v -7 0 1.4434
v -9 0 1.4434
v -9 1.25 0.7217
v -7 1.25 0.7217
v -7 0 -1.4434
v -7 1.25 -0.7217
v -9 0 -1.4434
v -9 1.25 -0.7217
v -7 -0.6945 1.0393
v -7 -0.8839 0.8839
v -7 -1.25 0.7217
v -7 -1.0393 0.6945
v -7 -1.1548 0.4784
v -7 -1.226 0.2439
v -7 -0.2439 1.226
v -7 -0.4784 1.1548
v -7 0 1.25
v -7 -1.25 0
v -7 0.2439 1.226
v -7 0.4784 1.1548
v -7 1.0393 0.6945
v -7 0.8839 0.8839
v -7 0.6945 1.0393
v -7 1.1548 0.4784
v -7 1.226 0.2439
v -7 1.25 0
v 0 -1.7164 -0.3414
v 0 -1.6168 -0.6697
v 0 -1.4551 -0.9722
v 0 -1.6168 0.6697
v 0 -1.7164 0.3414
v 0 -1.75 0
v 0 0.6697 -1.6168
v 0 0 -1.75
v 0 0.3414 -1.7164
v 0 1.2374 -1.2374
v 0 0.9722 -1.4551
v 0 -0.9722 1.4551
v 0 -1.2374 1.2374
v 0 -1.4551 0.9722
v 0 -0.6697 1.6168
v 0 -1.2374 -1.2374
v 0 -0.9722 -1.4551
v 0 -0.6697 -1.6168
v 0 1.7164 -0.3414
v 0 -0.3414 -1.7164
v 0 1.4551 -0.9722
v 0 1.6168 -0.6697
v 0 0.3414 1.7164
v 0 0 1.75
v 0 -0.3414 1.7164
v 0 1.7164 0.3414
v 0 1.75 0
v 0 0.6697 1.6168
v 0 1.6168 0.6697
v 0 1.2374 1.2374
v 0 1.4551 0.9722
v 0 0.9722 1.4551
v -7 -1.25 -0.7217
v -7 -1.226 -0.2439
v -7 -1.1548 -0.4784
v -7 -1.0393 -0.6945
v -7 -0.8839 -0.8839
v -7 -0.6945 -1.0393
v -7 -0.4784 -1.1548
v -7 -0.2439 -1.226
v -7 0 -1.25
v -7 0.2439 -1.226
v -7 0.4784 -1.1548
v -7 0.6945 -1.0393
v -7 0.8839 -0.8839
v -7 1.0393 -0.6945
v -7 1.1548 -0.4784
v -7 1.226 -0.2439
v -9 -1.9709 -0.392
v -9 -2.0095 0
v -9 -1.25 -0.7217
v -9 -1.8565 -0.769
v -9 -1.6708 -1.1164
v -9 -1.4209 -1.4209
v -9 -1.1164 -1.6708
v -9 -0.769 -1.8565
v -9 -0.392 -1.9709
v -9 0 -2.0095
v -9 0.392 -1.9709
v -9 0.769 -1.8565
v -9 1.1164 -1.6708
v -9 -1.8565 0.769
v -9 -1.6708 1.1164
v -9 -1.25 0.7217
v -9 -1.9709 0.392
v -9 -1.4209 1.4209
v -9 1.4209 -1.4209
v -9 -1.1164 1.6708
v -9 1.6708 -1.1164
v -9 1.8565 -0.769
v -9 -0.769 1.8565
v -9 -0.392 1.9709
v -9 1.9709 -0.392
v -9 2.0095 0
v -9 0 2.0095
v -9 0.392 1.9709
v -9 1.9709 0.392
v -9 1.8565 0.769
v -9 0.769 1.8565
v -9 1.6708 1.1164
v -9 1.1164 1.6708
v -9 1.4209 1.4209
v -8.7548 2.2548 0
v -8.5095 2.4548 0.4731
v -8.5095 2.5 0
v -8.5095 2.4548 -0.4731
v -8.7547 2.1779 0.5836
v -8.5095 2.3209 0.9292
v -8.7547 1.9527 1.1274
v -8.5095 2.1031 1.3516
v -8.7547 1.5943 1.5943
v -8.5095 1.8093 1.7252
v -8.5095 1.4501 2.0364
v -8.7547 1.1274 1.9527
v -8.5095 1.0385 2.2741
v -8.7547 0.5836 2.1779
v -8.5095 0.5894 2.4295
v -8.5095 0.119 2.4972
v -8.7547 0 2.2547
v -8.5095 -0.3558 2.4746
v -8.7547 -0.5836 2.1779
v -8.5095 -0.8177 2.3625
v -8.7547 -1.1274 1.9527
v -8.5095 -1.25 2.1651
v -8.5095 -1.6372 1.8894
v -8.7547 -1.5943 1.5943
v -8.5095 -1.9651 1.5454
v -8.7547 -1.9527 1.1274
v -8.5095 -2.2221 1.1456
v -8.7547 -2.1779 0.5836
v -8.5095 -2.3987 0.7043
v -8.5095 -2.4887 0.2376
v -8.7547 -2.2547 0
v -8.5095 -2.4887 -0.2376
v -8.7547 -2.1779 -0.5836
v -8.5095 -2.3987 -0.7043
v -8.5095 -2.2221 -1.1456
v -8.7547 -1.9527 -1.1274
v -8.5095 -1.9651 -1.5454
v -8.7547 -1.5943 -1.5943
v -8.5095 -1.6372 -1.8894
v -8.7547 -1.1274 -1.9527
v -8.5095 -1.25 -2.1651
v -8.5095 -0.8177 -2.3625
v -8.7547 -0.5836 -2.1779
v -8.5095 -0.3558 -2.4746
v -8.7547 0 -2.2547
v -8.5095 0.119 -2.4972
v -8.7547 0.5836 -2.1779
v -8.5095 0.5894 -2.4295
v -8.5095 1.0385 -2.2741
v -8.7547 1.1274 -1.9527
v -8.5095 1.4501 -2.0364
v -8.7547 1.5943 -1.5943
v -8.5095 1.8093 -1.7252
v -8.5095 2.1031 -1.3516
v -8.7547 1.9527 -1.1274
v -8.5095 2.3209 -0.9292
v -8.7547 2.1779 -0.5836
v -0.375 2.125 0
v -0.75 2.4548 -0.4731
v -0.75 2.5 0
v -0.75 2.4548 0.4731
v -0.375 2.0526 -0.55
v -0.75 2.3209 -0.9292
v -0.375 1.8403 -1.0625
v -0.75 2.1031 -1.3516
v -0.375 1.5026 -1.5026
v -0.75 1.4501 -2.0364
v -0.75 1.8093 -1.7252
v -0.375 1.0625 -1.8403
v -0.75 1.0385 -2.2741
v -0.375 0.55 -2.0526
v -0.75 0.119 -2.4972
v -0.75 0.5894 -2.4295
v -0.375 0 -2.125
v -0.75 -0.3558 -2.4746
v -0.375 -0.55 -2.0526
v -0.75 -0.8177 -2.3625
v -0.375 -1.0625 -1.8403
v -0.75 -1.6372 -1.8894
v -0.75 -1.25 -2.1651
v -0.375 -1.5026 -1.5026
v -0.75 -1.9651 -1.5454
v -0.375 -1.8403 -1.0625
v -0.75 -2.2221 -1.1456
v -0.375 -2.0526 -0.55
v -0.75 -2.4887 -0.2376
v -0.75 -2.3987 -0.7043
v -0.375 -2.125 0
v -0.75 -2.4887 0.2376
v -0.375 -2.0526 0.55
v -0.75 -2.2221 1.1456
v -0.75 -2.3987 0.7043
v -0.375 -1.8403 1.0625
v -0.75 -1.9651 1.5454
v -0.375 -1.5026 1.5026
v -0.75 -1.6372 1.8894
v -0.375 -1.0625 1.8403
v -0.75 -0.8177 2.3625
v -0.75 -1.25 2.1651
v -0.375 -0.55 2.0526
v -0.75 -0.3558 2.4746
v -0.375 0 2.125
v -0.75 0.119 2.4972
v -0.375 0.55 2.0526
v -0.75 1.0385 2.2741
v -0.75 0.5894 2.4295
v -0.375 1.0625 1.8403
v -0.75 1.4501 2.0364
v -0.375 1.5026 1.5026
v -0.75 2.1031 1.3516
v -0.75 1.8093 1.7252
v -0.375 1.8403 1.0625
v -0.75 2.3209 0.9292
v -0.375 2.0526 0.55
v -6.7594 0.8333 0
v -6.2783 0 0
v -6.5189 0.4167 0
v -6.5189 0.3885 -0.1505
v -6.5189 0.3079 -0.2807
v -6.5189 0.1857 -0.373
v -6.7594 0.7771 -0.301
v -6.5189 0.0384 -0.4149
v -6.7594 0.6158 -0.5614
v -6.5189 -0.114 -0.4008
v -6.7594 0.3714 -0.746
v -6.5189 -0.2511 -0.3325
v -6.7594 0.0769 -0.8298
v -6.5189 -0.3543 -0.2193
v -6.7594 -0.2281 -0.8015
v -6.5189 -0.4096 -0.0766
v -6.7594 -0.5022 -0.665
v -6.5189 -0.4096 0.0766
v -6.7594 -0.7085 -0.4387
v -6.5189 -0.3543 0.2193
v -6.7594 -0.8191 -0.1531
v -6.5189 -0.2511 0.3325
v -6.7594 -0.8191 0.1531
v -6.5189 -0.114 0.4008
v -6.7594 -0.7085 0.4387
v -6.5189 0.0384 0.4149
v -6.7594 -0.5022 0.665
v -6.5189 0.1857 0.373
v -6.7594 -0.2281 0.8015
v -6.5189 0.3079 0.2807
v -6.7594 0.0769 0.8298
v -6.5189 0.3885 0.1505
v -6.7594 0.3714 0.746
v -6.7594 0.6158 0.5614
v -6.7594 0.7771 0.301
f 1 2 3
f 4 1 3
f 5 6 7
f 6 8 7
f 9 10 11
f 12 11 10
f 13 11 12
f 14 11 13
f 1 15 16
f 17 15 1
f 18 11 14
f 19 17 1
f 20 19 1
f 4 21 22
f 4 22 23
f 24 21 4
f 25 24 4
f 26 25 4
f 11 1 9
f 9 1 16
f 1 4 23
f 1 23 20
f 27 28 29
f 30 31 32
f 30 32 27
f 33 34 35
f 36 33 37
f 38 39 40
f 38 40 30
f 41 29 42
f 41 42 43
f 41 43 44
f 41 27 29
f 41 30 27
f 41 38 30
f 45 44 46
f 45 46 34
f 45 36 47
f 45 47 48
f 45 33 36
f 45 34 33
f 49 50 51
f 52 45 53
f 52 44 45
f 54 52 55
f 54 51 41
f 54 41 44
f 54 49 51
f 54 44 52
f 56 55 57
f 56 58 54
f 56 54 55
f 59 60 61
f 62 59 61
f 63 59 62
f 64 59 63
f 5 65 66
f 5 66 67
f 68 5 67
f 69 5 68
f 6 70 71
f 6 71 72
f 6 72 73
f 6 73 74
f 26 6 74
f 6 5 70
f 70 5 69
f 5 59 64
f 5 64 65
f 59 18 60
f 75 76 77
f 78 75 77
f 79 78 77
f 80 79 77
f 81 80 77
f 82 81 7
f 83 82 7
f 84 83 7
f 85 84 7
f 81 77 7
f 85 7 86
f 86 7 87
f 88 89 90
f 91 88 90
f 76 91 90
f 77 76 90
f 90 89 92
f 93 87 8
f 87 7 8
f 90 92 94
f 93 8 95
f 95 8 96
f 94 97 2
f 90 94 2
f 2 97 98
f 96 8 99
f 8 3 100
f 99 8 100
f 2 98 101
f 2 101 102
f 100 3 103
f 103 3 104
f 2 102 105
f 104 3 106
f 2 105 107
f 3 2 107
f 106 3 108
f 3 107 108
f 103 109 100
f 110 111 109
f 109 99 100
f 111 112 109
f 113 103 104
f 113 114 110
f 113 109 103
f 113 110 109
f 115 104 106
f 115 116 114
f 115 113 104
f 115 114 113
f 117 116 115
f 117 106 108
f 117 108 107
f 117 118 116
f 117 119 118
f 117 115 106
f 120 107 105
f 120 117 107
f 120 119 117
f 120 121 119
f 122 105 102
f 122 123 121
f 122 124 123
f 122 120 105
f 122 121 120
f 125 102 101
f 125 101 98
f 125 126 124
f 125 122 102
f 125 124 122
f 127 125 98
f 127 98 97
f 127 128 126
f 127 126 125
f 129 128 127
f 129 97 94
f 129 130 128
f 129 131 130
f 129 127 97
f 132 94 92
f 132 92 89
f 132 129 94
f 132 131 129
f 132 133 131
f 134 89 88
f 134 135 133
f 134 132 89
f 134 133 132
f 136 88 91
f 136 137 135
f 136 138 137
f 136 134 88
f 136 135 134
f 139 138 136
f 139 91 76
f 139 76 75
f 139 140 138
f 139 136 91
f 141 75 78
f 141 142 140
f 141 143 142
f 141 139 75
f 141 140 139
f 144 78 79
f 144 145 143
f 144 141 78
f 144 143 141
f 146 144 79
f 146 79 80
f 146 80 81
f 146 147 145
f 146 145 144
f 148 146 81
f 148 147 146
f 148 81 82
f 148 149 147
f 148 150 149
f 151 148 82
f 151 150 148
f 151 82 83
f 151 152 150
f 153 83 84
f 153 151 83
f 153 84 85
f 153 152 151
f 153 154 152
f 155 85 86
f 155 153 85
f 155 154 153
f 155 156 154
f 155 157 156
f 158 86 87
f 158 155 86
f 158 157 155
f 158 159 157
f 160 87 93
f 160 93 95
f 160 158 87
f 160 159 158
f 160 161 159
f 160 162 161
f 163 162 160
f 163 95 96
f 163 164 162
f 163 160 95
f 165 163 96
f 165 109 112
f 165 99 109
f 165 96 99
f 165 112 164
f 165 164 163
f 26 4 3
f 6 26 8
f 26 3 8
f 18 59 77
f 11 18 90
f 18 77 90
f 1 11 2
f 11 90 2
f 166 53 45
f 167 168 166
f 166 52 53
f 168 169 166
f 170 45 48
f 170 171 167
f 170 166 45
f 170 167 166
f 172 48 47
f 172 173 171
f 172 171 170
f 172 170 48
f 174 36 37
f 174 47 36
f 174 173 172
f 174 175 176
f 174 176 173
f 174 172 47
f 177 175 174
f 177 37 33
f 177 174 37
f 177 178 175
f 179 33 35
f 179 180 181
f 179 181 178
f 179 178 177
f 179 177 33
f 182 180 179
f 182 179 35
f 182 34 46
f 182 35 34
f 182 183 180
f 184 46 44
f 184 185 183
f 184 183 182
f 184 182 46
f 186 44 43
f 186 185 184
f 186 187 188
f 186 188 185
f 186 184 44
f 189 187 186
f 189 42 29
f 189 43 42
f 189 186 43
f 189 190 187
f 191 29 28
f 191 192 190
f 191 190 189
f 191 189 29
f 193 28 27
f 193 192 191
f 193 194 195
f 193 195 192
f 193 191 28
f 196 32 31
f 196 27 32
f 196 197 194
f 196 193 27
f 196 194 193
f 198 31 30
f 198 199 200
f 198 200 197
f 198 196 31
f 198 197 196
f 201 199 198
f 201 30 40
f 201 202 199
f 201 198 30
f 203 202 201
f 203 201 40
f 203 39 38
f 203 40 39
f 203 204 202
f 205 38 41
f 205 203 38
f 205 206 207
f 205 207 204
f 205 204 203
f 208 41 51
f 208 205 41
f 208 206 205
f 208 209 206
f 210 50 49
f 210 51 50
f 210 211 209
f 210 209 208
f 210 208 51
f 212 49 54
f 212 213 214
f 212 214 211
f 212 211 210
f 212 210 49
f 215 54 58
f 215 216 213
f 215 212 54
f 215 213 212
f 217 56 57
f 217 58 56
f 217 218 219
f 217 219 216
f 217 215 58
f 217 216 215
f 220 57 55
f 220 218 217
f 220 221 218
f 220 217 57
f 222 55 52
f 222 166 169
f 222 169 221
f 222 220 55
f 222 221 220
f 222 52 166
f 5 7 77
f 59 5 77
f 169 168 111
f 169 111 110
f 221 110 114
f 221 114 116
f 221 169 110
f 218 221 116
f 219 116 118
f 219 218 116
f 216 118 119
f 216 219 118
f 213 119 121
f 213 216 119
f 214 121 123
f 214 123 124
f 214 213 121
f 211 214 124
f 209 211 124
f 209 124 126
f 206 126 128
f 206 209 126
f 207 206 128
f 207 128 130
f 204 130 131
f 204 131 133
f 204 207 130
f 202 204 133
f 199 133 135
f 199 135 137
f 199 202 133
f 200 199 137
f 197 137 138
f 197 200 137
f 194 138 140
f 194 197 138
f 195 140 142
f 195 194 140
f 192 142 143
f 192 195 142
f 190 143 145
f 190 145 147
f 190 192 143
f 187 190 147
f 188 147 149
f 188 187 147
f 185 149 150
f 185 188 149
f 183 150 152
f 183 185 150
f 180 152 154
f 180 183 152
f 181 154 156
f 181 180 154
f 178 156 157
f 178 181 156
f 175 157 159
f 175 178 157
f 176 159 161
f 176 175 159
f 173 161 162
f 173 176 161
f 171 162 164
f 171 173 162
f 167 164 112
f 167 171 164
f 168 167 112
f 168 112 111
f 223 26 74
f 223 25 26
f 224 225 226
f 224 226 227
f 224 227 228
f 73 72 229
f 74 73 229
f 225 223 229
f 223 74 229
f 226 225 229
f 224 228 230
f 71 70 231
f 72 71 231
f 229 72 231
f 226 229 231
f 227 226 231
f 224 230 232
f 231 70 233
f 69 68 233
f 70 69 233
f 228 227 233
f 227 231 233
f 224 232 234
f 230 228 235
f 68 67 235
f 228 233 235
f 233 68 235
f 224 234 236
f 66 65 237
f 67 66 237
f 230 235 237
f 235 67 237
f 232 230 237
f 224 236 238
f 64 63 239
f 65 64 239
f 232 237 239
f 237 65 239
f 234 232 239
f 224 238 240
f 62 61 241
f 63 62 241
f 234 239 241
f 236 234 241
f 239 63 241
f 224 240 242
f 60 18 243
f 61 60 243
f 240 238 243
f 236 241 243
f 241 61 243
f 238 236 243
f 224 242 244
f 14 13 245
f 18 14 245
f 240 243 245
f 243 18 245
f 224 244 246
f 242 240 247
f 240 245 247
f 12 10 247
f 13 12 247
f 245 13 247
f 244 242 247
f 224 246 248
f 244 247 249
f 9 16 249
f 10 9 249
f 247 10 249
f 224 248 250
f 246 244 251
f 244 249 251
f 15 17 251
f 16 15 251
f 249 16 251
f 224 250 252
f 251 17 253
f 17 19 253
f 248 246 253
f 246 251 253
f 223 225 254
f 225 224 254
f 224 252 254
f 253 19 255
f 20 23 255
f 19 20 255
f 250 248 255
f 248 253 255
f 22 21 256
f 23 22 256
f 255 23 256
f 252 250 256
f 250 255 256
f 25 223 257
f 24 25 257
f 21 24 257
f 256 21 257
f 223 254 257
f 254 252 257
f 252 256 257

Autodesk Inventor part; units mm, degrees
sketch "Sketch_1" plane through (0, 0, 0) normal (0, 0, 1) x (1, 0, 0)
  line L0 (0, 0) -> (-9, 0)
  line L1 (-9, 0) -> (-9, 2.0095)
  line L2 (-9, 2.0095) -> (-8.5095, 2.5)
  line L3 (-8.5095, 2.5) -> (-0.75, 2.5)
  line L4 (-0.75, 2.5) -> (0, 1.75)
  line L5 (0, 1.75) -> (0, 0)
  line L6 (0, 0) -> (-9, 0)
revolve "Revolution1" add sketch "Sketch_1" angle 360 about axis through (0, 0, 0) along (1, 0, 0)
thread "Thread1" size "M5x0.8" class "6g" standard "ISO Metric profile" full length
sketch "Sketch_2" plane through (-9, 0, 0) normal (-1, 0, 0) x (0, 1, 0)
  line L0 (-1.25, 0.7217) -> (-1.25, -0.7217)
  line L1 (-1.25, -0.7217) -> (0, -1.4434)
  line L2 (0, -1.4434) -> (1.25, -0.7217)
  line L3 (1.25, -0.7217) -> (1.25, 0.7217)
  line L4 (1.25, 0.7217) -> (0, 1.4434)
  line L5 (0, 1.4434) -> (-1.25, 0.7217)
extrude "Extrusion1" cut sketch "Sketch_2" against normal blind 2
sketch "Sketch_3" plane through (0, 0, 0) normal (0, 0, 1) x (1, 0, 0)
  line L0 (-6.2783, 0) -> (-7, 0)
  line L1 (-7, 0) -> (-7, 1.25)
  line L2 (-7, 1.25) -> (-6.2783, 0)
  line L3 (-6.2783, 0) -> (-7, 0)
revolve "Revolution2" cut sketch "Sketch_3" angle 360 about axis through (-6.2783, 0, 0) along (1, 0, 0)
ref_plane "CP_XY" through (0, 0, 0) normal (1, 0, 0) x (0, 0, -1)
ref_plane "CP_YZ" through (0, 0, 0) normal (0, 0, -1) x (0, 1, 0)
ref_plane "CP_ZX" through (0, 0, 0) normal (0, 1, 0) x (1, 0, 0)
properties part number "SET-SCREW5-9"
